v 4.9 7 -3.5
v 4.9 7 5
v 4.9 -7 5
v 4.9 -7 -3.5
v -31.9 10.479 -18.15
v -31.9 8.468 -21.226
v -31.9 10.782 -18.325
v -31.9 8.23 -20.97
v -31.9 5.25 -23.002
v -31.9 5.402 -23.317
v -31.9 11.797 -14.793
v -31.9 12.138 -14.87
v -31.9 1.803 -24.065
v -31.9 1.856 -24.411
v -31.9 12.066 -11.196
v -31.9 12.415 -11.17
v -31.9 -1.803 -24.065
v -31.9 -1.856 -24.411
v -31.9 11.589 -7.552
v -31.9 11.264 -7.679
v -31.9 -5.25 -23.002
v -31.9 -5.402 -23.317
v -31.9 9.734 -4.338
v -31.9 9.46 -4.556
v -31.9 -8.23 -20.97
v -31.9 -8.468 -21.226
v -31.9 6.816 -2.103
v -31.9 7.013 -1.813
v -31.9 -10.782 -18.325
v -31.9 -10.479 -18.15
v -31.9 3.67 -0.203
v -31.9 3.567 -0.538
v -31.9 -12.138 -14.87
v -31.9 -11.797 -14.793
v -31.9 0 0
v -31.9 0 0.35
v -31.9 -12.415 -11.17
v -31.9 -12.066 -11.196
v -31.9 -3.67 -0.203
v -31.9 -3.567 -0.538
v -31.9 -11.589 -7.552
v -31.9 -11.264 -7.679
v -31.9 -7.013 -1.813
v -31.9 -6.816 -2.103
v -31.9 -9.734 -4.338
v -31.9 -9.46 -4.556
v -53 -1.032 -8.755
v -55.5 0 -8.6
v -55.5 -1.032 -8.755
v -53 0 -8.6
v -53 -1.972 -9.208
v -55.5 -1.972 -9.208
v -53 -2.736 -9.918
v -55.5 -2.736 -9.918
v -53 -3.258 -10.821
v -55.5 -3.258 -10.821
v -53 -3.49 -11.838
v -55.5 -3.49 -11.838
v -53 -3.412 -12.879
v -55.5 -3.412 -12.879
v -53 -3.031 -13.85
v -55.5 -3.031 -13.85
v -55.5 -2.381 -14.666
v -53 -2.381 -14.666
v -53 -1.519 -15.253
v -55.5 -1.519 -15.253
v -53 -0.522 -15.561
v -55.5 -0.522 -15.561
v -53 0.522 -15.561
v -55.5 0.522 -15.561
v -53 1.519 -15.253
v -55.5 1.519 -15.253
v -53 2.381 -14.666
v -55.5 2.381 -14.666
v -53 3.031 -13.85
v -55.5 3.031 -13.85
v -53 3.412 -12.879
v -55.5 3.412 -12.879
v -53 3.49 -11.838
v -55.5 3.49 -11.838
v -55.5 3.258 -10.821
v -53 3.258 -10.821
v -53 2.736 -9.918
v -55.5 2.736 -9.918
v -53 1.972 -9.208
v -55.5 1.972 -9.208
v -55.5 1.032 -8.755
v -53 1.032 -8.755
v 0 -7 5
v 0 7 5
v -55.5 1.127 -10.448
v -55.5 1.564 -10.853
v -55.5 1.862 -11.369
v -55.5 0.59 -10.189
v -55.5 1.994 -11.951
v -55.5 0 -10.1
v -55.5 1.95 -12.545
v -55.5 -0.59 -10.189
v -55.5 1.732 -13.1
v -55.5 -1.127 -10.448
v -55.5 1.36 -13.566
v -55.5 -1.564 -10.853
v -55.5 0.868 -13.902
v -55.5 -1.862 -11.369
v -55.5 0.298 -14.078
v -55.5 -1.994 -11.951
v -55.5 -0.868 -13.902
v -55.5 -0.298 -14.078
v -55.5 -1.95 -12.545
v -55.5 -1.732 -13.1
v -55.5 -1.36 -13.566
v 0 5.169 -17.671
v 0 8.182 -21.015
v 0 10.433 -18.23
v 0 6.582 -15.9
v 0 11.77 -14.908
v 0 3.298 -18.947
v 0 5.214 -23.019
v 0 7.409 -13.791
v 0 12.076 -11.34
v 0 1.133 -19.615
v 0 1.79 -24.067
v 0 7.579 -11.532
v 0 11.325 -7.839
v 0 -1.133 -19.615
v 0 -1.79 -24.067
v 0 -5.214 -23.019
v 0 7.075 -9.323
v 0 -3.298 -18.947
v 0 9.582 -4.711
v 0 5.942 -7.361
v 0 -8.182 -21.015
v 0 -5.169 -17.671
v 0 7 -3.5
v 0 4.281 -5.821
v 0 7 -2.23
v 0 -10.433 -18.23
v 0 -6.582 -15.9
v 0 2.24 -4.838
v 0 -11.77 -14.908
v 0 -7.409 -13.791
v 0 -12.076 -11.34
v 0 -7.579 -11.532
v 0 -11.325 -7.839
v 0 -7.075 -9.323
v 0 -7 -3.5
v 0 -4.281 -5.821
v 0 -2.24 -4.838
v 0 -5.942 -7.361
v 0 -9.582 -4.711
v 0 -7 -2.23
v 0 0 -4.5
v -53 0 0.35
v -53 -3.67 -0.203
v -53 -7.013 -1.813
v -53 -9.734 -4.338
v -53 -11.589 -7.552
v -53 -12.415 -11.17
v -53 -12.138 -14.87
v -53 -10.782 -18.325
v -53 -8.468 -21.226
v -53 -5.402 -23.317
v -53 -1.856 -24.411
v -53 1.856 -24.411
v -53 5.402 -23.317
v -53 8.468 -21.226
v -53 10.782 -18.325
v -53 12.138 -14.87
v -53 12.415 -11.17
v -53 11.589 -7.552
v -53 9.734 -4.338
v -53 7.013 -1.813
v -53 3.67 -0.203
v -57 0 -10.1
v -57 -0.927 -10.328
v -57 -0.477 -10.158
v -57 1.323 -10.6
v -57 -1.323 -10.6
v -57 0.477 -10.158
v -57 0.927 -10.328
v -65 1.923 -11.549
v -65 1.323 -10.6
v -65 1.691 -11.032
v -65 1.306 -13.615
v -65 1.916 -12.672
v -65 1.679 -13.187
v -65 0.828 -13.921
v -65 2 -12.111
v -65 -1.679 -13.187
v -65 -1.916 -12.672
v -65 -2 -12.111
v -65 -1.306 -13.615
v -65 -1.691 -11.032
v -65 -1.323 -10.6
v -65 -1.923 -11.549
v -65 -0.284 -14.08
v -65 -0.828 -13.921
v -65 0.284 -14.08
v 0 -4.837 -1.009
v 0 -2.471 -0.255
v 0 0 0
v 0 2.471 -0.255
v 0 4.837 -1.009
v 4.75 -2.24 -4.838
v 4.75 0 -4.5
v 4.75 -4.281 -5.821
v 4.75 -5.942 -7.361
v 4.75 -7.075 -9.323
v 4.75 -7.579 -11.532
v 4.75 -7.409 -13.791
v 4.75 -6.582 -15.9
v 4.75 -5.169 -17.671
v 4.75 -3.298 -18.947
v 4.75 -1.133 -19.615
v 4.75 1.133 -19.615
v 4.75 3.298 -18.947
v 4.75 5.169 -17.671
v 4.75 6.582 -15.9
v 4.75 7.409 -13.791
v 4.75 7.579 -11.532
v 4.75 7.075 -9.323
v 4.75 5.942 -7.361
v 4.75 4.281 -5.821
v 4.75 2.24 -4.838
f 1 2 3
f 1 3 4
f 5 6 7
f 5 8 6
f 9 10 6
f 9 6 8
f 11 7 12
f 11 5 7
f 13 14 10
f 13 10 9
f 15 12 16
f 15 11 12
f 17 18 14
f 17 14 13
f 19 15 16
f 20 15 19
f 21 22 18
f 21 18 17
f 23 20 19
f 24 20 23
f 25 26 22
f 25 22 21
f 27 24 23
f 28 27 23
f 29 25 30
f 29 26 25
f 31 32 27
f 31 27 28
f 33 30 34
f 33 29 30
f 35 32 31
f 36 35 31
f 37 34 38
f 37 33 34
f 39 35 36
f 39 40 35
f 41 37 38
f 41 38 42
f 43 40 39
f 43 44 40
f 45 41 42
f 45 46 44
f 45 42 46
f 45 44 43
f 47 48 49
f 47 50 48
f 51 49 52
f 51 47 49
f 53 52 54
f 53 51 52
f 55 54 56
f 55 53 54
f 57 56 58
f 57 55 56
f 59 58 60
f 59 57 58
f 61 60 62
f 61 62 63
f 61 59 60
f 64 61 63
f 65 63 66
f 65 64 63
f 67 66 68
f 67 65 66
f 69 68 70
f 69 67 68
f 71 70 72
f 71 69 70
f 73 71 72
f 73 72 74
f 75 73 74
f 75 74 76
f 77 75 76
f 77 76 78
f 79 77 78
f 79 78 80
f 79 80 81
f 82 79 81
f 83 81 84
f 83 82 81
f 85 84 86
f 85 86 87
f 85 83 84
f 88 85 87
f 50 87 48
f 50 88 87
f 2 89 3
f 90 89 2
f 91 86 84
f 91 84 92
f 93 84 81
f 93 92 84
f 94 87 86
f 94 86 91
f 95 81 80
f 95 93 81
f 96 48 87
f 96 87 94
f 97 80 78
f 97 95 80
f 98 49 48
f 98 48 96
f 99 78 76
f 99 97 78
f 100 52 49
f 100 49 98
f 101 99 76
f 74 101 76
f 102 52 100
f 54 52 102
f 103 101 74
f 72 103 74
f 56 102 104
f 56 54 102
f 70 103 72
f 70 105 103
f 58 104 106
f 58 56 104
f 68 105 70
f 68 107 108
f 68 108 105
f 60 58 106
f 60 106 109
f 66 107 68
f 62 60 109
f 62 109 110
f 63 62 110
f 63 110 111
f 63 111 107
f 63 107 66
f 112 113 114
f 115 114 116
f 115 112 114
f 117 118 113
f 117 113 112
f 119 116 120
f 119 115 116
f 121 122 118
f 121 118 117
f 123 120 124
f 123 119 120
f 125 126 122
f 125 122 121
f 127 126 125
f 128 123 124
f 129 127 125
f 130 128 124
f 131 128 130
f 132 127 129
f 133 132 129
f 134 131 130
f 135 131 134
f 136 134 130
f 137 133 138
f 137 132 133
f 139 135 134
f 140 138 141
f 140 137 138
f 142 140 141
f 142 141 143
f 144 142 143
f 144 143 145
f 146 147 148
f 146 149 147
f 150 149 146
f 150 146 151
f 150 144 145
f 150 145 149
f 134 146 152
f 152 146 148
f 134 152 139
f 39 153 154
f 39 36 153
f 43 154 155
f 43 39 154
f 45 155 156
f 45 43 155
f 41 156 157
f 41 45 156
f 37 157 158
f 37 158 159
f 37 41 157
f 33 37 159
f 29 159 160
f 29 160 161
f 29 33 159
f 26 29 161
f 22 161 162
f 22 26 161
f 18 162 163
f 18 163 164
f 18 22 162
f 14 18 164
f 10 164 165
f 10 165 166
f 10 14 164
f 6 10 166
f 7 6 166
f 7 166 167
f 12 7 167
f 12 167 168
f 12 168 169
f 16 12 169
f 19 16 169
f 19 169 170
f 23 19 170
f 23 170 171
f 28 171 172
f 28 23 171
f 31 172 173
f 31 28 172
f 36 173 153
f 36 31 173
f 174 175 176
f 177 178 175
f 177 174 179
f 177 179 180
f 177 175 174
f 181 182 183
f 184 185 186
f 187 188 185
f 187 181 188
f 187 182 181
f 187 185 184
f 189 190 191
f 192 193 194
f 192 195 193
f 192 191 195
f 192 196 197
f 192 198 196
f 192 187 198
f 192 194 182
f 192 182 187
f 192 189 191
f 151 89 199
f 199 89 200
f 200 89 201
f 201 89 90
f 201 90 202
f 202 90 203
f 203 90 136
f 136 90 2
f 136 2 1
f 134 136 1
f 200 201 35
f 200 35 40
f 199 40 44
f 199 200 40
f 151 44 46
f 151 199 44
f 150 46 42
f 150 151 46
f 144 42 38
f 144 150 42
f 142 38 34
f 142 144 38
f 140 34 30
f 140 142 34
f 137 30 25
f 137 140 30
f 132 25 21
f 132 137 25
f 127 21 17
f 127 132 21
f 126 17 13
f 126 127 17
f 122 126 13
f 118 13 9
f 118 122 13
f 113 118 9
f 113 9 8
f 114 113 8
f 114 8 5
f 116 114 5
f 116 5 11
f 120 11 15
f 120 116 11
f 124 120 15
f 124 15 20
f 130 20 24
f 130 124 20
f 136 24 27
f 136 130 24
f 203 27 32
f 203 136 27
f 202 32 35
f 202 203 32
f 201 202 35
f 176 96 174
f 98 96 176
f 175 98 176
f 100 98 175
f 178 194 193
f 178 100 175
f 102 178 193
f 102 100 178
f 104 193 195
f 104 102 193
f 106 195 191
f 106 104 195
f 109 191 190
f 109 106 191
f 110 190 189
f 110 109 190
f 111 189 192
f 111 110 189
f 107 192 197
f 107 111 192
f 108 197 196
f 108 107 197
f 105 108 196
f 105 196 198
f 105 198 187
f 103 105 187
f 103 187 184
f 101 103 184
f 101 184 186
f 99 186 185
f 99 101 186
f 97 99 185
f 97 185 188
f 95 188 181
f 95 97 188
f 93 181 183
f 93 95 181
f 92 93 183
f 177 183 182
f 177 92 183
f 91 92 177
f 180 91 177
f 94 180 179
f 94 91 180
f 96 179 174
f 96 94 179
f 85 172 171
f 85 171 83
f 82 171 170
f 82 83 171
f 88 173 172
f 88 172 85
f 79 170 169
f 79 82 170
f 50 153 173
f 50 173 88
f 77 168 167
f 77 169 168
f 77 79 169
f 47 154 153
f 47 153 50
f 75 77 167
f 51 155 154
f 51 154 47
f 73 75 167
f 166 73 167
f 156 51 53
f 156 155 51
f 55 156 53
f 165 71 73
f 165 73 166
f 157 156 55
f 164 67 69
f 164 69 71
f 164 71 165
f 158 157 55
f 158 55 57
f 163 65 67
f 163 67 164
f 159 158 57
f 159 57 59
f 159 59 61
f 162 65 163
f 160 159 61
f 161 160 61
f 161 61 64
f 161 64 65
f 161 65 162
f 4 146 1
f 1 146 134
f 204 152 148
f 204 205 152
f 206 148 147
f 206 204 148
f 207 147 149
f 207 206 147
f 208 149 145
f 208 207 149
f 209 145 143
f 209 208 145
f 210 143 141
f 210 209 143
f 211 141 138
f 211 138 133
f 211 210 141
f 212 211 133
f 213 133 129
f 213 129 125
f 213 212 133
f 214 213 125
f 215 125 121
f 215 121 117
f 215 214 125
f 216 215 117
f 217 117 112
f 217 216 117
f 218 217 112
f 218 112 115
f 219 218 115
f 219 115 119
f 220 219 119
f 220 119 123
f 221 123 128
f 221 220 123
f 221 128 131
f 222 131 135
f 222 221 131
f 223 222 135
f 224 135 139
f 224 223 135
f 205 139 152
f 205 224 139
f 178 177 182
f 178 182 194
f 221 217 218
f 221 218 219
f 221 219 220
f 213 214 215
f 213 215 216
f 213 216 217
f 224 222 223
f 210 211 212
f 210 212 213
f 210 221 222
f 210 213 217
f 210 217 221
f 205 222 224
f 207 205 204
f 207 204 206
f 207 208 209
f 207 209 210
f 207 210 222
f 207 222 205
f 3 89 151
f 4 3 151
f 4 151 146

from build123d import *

# Parameters (mm, degrees)
CUT_EXTRUDE1_START  = -8
CUT_EXTRUDE1_DEPTH  = 8
SKETCH4_W           = 8.5
SKETCH4_H           = 14
BOSS_EXTRUDE1_DEPTH = 4.9


with BuildPart() as part:
    # Sketch1 → Revolve5 (revolve)
    with BuildSketch(Plane(origin=(0, 0, 0), x_dir=(1, 0, 0), z_dir=(0, 1, 0))):
        Polygon((4.75, 4.5), (4.75, 12.1), (-65, 12.1), (-65, 10.1), (-55.5, 10.1), (-55.5, 8.6), (-53, 8.6), (-53, -0.35), (-31.9, -0.35), (-31.9, 0), (0, 0), (0, 4.5), align=None)
    revolve(axis=Axis((-65, 0, -12.1), (1, 0, 0)))

    # Sketch2 → Cut-Extrude1 (cut)
    with BuildSketch(Plane.ZY.offset(65).offset(CUT_EXTRUDE1_START)):
        with BuildLine():
            ThreePointArc((-10.6, -1.322875656), (-10.1, 0), (-10.6, 1.322875656))
            Line((-10.6, 1.322875656), (-10.6, -1.322875656))
        make_face()
    extrude(amount=CUT_EXTRUDE1_DEPTH, mode=Mode.SUBTRACT)

    # Sketch4 → Boss-Extrude1 (add)
    with BuildSketch(Plane(origin=(0, 0, 0), x_dir=(0, 0, -1), z_dir=(1, 0, 0))):
        with Locations((-0.75, 0)):
            Rectangle(SKETCH4_W, SKETCH4_H)
    extrude(amount=BOSS_EXTRUDE1_DEPTH)


solid = part.part
